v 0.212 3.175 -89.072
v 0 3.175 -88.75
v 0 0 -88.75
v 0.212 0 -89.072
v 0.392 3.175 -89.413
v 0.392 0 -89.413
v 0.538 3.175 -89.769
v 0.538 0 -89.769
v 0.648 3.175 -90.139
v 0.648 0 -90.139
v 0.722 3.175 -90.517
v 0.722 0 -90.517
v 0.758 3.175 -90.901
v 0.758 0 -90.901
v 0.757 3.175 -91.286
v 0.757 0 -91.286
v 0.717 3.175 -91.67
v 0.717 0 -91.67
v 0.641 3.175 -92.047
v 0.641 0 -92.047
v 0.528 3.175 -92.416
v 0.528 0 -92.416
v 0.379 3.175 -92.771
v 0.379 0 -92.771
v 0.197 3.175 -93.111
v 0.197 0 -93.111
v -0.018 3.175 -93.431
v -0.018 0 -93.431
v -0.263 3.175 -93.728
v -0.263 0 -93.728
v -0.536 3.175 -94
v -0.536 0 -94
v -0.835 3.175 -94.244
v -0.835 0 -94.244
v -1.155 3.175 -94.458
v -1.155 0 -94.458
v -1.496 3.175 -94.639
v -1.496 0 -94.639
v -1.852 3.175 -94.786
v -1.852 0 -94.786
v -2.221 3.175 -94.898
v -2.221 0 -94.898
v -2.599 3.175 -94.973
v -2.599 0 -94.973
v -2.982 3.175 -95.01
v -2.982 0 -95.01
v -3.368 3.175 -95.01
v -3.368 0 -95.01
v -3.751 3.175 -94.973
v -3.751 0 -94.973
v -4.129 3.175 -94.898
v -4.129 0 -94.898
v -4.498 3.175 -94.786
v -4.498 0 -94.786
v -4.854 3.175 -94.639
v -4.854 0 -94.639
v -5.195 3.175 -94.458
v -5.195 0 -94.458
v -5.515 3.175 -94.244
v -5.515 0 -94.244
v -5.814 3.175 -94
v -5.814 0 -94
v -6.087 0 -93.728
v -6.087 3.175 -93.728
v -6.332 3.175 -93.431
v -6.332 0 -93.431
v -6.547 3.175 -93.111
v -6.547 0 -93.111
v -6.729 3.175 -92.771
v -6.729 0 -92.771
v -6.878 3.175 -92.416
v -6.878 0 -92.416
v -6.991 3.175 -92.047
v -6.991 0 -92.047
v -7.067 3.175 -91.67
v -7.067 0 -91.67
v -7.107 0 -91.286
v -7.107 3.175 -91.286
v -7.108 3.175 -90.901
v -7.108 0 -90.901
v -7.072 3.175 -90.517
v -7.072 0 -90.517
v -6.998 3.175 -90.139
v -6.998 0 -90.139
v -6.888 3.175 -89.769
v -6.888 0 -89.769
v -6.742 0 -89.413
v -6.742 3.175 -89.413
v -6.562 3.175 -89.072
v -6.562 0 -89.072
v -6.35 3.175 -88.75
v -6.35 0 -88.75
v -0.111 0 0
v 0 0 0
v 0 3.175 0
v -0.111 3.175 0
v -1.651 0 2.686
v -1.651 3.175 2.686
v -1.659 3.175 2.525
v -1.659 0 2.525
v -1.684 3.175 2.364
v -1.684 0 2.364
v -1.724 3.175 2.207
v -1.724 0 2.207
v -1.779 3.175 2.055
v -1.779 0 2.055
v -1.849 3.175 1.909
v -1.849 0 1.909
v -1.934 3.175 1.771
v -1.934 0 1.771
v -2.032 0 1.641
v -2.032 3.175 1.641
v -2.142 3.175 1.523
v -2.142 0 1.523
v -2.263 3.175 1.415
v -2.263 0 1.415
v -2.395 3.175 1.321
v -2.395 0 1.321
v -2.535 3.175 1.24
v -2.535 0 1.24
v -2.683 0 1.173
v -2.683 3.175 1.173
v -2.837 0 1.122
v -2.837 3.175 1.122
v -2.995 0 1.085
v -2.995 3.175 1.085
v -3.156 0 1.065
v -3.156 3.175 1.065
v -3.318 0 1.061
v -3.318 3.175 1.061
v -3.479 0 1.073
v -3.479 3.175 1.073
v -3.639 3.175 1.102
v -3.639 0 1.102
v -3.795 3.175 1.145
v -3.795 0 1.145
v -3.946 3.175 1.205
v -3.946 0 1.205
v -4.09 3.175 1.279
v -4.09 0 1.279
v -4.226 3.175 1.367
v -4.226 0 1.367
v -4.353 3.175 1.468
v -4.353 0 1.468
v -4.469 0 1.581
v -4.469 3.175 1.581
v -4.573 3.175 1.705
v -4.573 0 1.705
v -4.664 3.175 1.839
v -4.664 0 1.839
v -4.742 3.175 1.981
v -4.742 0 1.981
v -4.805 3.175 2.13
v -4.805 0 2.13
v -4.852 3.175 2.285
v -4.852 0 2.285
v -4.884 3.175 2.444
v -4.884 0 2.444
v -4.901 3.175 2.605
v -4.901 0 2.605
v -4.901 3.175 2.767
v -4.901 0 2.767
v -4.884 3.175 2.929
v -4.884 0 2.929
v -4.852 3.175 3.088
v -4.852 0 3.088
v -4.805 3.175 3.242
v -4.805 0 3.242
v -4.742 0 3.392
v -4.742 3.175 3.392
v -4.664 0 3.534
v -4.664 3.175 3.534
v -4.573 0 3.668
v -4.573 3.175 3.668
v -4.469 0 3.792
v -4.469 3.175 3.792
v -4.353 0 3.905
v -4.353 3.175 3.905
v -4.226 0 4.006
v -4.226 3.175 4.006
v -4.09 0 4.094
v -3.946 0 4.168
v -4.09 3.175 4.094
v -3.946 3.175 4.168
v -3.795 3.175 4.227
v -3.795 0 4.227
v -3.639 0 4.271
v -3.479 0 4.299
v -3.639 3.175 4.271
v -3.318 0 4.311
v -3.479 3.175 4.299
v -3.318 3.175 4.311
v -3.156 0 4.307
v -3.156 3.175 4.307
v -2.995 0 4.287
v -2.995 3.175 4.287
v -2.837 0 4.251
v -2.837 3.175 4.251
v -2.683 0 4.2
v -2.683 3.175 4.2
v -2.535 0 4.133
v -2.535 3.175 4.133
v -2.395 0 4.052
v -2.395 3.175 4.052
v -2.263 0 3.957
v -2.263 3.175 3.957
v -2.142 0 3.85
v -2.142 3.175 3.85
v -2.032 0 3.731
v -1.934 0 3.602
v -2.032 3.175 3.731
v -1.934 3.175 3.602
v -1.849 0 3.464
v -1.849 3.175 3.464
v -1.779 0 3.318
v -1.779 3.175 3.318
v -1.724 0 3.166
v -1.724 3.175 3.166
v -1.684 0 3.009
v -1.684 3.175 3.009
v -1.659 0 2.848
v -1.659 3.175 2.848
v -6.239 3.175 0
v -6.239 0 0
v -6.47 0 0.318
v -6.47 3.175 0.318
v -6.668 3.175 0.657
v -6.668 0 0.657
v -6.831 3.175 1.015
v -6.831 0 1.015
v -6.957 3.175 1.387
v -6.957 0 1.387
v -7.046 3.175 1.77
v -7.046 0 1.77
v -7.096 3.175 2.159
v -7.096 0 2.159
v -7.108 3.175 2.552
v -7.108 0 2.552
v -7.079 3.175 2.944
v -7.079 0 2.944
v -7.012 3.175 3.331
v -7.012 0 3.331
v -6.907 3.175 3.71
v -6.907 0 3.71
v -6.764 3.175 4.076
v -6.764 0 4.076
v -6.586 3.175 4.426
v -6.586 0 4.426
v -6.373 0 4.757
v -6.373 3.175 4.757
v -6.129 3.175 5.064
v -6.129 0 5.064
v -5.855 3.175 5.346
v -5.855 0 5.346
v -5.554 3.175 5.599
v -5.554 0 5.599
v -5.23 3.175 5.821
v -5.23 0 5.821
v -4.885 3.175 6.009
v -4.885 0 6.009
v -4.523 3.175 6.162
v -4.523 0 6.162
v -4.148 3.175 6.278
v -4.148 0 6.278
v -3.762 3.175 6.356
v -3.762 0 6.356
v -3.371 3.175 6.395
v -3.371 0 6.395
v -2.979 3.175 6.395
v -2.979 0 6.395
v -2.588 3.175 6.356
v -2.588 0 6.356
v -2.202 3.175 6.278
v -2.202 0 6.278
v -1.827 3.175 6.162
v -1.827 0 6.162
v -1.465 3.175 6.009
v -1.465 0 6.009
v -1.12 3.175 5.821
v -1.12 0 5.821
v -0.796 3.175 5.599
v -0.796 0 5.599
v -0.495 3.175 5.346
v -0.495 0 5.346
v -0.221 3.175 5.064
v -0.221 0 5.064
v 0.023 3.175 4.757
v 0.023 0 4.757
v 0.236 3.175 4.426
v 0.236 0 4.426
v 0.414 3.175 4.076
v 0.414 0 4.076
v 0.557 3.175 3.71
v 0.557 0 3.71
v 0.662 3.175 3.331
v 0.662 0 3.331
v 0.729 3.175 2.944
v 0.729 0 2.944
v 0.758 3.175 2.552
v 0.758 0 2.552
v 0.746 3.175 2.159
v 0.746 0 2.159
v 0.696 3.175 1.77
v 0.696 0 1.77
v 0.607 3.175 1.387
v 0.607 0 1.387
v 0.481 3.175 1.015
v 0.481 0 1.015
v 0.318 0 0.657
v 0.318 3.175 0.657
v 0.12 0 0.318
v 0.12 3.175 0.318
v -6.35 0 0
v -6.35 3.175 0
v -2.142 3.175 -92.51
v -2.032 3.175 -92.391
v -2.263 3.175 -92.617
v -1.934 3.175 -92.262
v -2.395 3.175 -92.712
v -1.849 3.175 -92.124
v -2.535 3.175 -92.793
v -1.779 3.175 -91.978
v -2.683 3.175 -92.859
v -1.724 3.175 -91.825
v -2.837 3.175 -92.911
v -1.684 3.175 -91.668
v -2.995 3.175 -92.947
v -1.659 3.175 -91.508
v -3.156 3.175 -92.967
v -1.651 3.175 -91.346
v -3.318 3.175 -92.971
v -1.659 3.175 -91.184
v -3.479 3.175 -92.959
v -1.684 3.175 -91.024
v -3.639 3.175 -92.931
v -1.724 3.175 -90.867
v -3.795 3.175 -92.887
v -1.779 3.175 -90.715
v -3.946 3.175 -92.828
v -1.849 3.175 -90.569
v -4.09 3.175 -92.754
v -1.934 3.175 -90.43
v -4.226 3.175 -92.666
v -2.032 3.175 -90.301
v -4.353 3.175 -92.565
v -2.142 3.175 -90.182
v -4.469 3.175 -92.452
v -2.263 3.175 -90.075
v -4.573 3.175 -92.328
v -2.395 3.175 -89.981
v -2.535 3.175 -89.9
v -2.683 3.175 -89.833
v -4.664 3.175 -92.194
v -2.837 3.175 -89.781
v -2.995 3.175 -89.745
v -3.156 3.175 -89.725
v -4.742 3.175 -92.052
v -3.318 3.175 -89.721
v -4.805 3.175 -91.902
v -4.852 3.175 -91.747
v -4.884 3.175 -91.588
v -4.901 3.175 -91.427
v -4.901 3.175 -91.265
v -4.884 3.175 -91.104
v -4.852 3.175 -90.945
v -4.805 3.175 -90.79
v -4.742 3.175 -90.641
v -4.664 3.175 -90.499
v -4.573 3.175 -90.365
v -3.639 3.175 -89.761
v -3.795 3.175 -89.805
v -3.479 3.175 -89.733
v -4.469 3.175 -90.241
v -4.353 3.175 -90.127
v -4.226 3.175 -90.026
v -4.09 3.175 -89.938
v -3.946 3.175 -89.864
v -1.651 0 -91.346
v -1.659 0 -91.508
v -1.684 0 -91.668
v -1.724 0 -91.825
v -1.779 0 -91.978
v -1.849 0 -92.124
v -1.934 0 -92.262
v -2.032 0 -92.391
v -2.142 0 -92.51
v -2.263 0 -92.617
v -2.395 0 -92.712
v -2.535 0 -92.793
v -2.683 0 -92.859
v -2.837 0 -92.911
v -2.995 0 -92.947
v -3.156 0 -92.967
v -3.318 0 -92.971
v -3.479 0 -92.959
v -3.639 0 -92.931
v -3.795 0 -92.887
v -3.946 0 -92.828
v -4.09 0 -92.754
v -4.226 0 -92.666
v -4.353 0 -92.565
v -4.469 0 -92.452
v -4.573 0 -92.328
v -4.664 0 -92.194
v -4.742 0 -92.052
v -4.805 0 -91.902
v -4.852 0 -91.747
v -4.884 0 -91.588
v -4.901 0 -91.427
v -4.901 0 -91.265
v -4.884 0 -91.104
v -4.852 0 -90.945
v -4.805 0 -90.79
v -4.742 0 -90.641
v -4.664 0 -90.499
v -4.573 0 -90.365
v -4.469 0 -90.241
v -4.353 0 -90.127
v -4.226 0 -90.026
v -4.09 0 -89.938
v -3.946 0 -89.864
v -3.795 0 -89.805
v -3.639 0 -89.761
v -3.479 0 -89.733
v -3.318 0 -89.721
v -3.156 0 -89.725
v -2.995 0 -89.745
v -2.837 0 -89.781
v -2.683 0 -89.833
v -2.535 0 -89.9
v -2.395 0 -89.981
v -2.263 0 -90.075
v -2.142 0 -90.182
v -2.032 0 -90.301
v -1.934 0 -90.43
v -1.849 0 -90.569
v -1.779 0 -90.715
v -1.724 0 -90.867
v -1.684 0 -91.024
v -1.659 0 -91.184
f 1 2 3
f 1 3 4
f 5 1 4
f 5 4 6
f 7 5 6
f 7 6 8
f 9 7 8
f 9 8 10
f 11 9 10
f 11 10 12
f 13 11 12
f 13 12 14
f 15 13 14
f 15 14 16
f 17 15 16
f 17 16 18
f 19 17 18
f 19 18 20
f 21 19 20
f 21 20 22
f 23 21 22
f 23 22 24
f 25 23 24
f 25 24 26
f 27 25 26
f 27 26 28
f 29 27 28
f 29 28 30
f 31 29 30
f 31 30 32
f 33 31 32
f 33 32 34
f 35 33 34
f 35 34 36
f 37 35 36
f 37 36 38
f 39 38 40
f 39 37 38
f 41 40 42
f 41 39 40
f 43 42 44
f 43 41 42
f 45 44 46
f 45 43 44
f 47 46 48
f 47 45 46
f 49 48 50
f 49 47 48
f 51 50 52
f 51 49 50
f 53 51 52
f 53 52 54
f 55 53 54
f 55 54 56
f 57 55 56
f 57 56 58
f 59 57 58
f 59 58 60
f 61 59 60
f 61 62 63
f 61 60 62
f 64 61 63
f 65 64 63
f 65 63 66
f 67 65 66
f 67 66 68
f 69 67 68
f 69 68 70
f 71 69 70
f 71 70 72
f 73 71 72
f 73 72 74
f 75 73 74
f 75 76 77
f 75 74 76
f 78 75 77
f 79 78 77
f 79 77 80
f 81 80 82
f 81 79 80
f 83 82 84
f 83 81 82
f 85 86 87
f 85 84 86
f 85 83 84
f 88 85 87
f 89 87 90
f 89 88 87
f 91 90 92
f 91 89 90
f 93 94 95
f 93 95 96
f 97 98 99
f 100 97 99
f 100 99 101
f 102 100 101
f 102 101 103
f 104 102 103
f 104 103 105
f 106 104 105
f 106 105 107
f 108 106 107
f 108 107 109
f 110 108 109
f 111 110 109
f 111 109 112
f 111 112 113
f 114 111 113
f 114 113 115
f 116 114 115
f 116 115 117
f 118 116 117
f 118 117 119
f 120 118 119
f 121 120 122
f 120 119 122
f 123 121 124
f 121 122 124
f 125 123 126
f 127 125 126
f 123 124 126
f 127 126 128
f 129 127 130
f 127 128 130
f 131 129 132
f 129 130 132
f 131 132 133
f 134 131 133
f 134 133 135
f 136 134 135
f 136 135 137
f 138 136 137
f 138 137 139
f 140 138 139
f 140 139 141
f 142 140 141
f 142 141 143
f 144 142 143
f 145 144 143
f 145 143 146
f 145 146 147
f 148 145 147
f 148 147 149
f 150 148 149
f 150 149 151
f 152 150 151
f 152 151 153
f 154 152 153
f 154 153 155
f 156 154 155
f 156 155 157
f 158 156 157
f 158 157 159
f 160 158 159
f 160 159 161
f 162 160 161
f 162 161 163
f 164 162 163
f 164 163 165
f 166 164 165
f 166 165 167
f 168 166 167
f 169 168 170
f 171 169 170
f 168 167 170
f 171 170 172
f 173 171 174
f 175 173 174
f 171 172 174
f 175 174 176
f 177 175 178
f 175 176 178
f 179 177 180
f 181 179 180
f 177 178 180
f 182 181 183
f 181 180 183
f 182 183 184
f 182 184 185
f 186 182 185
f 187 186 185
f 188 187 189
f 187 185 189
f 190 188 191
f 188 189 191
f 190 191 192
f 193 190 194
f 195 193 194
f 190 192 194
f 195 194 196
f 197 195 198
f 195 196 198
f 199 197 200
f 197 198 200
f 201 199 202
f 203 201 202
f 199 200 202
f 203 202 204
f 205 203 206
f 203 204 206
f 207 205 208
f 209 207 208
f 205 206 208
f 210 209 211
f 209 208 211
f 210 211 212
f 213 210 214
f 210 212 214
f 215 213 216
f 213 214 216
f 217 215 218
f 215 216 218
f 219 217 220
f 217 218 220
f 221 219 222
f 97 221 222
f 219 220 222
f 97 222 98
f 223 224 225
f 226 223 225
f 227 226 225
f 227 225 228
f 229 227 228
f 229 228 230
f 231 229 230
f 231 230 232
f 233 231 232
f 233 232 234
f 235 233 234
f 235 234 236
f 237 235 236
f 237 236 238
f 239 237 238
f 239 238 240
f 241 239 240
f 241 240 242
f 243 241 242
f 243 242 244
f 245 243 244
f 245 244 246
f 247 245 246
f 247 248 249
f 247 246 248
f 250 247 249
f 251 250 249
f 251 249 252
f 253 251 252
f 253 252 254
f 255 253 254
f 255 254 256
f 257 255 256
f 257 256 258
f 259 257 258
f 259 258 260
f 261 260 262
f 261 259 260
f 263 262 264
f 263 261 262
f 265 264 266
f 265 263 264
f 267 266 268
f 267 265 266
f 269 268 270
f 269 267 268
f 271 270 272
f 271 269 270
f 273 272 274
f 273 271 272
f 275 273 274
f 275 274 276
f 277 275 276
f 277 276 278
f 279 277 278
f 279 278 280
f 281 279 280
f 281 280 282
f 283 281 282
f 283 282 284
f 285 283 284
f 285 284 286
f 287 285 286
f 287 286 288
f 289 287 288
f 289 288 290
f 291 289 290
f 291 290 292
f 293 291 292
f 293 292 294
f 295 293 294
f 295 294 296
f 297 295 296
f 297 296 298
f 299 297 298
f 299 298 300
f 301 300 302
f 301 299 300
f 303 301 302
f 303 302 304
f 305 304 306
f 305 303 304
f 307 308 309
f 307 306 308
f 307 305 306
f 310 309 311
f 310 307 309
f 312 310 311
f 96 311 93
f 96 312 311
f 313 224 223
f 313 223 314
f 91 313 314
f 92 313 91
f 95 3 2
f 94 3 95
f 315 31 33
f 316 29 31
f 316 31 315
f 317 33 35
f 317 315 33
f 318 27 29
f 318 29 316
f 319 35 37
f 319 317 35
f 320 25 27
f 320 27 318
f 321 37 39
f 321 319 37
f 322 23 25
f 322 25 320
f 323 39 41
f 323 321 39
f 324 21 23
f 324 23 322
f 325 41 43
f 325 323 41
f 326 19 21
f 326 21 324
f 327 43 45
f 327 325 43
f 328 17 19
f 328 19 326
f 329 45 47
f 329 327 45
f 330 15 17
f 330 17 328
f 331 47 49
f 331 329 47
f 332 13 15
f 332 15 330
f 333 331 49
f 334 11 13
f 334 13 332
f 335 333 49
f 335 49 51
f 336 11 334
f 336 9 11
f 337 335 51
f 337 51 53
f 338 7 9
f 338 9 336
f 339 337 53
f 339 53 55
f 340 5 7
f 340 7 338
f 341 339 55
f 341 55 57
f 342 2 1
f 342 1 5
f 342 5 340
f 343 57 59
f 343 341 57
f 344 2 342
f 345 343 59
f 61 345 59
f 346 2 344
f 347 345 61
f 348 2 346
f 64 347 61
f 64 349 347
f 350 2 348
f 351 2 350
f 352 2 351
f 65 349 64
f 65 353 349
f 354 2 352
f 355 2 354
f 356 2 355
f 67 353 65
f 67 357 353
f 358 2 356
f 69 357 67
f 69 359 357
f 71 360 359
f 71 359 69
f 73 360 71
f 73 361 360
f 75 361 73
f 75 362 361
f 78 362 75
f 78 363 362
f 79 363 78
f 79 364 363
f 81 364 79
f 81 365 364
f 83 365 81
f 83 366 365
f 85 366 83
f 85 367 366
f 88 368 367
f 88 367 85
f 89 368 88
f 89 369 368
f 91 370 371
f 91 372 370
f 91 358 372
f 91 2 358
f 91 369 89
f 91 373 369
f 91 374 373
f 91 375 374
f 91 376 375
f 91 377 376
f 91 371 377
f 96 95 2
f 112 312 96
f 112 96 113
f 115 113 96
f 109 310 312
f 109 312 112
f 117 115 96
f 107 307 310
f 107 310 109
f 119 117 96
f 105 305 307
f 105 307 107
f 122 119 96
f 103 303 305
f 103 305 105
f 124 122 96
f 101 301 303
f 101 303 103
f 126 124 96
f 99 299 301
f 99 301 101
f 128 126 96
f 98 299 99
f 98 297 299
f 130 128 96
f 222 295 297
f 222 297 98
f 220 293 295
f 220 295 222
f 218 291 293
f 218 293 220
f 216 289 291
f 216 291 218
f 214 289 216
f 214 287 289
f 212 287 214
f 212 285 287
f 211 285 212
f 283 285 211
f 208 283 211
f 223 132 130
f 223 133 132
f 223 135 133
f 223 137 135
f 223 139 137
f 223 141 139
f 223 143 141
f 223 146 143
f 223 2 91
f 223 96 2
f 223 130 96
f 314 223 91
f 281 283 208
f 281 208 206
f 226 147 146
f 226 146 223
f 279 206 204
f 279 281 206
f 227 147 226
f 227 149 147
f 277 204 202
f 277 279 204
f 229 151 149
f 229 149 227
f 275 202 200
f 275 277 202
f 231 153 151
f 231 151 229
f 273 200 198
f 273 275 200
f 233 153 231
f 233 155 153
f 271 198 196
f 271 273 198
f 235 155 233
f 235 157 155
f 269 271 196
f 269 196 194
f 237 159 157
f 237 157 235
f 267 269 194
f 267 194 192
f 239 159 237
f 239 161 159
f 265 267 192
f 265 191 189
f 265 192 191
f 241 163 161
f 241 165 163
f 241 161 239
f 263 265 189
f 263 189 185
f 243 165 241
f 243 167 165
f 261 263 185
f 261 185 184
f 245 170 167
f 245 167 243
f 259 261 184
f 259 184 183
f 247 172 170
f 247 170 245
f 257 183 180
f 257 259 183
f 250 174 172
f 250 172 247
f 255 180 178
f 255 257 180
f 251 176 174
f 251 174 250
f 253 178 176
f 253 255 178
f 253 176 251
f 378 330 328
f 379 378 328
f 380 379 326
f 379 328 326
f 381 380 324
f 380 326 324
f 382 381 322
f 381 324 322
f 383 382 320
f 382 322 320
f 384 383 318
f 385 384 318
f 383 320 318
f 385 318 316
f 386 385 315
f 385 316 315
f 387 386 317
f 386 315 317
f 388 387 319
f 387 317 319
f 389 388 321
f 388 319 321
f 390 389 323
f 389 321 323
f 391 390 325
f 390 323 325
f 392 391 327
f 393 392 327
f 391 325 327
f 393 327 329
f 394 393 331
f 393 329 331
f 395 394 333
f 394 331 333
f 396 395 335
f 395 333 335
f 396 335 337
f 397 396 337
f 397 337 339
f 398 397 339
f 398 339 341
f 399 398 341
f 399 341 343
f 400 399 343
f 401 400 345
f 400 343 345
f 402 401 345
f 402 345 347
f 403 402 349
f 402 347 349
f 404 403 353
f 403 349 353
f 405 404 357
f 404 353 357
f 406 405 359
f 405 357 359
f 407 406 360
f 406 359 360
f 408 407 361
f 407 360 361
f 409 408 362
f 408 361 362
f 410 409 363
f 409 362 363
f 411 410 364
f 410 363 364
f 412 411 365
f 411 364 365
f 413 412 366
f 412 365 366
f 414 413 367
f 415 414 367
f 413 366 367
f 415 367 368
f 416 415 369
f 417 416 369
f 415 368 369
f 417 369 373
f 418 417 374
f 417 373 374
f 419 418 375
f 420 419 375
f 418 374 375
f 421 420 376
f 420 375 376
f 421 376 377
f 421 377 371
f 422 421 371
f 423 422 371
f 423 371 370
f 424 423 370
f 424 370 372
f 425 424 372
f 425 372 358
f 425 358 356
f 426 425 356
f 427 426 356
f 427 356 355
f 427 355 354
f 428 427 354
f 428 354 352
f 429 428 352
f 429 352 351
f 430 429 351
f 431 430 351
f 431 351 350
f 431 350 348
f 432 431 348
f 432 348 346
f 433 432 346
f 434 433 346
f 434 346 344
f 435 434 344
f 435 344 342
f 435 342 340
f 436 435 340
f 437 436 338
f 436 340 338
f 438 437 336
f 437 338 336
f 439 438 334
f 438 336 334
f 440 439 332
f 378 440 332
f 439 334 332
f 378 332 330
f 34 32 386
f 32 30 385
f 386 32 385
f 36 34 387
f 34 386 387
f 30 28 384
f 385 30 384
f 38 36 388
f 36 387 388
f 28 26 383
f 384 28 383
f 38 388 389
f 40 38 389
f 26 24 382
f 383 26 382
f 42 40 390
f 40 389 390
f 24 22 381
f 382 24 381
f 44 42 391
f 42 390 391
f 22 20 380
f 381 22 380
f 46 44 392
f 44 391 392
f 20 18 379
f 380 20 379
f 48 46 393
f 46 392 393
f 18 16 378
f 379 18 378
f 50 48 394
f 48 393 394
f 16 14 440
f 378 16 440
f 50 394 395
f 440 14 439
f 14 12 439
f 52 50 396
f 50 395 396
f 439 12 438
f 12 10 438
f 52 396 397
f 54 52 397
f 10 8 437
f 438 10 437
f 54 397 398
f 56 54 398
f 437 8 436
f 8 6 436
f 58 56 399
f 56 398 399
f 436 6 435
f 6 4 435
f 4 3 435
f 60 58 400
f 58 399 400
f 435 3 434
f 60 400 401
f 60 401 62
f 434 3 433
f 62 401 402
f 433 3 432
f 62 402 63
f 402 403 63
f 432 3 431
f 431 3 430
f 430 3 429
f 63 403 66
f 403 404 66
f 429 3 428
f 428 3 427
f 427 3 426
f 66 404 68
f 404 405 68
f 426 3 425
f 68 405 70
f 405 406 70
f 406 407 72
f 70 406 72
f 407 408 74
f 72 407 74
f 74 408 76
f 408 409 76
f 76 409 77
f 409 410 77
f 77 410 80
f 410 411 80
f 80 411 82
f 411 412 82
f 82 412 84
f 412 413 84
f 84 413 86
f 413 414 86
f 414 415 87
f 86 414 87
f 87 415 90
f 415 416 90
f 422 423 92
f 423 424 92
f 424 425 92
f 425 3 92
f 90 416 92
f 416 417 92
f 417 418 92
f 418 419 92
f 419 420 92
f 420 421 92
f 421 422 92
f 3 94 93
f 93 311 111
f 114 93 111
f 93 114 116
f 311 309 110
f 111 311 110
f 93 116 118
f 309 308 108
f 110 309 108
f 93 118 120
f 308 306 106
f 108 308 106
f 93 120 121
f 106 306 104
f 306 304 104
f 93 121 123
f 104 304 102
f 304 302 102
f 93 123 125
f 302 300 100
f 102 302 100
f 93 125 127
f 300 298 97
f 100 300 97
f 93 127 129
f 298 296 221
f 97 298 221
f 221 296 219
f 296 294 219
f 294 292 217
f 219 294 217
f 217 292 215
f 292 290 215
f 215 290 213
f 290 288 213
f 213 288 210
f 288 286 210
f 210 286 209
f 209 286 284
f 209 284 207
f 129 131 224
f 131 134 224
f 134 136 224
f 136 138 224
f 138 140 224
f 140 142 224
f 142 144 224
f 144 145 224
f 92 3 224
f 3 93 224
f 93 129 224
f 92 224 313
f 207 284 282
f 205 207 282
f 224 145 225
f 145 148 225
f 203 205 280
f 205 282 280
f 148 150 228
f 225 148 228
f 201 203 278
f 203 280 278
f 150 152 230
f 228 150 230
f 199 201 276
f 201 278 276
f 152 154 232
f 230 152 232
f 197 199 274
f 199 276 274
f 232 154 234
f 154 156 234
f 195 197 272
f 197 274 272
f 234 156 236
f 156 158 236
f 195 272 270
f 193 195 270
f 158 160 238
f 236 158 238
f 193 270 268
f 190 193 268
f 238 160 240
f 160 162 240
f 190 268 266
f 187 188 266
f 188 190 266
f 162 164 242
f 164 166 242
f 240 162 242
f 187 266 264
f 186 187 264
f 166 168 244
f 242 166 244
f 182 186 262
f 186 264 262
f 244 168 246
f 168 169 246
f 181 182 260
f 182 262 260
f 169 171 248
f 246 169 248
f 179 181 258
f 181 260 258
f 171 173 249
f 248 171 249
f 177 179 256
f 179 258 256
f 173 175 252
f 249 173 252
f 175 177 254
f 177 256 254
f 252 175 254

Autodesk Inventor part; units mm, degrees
ref_plane "YZ Plane" through (0, 0, 0) normal (1, 0, 0) x (0, 1, 0)
ref_plane "XZ Plane" through (0, 0, 0) normal (0, 1, 0) x (-1, 0, 0)
ref_plane "XY Plane" through (0, 0, 0) normal (0, 0, 1) x (1, 0, 0)
sketch "Sketch1" plane through (0, 0, 0) normal (0, 1, 0) x (-1, 0, 0)
  line L0 (0, 0) -> (6.35, 0)
  line L1 (6.35, 0) -> (6.35, -88.9)
  line L2 (6.35, -88.9) -> (0, -88.9)
  line L3 (0, -88.9) -> (0, 0)
  dimension "d0" = 6.35
  dimension "d1" = 88.9
extrude "Extrusion1" add sketch "Sketch1" along normal blind 3.175
sketch "Sketch2" plane through (0, 3.175, 0) normal (0, 1, 0) x (1, 0, 0)
  circle A0 centre (-3.175, -2.4668) radius 3.9335
  circle A1 centre (-3.175, 91.0782) radius 3.937
  point P0 (0, 0)
  dimension "d4" = 7.8671
  dimension "d5" = 7.874
extrude "Extrusion2" add sketch "Sketch2" against normal blind 3.175
sketch "Sketch3" plane through (0, 3.175, 0) normal (0, 1, 0) x (1, 0, 0)
  circle A0 centre (-3.277, 91.3462) radius 1.6256
  circle A1 centre (-3.277, -2.6864) radius 1.6256
  point P0 (0, 0)
  dimension "d8" = 3.2512
  dimension "d9" = 3.2512
extrude "Extrusion3" cut sketch "Sketch3" against normal blind 3.175
properties part number "linkage arm"
